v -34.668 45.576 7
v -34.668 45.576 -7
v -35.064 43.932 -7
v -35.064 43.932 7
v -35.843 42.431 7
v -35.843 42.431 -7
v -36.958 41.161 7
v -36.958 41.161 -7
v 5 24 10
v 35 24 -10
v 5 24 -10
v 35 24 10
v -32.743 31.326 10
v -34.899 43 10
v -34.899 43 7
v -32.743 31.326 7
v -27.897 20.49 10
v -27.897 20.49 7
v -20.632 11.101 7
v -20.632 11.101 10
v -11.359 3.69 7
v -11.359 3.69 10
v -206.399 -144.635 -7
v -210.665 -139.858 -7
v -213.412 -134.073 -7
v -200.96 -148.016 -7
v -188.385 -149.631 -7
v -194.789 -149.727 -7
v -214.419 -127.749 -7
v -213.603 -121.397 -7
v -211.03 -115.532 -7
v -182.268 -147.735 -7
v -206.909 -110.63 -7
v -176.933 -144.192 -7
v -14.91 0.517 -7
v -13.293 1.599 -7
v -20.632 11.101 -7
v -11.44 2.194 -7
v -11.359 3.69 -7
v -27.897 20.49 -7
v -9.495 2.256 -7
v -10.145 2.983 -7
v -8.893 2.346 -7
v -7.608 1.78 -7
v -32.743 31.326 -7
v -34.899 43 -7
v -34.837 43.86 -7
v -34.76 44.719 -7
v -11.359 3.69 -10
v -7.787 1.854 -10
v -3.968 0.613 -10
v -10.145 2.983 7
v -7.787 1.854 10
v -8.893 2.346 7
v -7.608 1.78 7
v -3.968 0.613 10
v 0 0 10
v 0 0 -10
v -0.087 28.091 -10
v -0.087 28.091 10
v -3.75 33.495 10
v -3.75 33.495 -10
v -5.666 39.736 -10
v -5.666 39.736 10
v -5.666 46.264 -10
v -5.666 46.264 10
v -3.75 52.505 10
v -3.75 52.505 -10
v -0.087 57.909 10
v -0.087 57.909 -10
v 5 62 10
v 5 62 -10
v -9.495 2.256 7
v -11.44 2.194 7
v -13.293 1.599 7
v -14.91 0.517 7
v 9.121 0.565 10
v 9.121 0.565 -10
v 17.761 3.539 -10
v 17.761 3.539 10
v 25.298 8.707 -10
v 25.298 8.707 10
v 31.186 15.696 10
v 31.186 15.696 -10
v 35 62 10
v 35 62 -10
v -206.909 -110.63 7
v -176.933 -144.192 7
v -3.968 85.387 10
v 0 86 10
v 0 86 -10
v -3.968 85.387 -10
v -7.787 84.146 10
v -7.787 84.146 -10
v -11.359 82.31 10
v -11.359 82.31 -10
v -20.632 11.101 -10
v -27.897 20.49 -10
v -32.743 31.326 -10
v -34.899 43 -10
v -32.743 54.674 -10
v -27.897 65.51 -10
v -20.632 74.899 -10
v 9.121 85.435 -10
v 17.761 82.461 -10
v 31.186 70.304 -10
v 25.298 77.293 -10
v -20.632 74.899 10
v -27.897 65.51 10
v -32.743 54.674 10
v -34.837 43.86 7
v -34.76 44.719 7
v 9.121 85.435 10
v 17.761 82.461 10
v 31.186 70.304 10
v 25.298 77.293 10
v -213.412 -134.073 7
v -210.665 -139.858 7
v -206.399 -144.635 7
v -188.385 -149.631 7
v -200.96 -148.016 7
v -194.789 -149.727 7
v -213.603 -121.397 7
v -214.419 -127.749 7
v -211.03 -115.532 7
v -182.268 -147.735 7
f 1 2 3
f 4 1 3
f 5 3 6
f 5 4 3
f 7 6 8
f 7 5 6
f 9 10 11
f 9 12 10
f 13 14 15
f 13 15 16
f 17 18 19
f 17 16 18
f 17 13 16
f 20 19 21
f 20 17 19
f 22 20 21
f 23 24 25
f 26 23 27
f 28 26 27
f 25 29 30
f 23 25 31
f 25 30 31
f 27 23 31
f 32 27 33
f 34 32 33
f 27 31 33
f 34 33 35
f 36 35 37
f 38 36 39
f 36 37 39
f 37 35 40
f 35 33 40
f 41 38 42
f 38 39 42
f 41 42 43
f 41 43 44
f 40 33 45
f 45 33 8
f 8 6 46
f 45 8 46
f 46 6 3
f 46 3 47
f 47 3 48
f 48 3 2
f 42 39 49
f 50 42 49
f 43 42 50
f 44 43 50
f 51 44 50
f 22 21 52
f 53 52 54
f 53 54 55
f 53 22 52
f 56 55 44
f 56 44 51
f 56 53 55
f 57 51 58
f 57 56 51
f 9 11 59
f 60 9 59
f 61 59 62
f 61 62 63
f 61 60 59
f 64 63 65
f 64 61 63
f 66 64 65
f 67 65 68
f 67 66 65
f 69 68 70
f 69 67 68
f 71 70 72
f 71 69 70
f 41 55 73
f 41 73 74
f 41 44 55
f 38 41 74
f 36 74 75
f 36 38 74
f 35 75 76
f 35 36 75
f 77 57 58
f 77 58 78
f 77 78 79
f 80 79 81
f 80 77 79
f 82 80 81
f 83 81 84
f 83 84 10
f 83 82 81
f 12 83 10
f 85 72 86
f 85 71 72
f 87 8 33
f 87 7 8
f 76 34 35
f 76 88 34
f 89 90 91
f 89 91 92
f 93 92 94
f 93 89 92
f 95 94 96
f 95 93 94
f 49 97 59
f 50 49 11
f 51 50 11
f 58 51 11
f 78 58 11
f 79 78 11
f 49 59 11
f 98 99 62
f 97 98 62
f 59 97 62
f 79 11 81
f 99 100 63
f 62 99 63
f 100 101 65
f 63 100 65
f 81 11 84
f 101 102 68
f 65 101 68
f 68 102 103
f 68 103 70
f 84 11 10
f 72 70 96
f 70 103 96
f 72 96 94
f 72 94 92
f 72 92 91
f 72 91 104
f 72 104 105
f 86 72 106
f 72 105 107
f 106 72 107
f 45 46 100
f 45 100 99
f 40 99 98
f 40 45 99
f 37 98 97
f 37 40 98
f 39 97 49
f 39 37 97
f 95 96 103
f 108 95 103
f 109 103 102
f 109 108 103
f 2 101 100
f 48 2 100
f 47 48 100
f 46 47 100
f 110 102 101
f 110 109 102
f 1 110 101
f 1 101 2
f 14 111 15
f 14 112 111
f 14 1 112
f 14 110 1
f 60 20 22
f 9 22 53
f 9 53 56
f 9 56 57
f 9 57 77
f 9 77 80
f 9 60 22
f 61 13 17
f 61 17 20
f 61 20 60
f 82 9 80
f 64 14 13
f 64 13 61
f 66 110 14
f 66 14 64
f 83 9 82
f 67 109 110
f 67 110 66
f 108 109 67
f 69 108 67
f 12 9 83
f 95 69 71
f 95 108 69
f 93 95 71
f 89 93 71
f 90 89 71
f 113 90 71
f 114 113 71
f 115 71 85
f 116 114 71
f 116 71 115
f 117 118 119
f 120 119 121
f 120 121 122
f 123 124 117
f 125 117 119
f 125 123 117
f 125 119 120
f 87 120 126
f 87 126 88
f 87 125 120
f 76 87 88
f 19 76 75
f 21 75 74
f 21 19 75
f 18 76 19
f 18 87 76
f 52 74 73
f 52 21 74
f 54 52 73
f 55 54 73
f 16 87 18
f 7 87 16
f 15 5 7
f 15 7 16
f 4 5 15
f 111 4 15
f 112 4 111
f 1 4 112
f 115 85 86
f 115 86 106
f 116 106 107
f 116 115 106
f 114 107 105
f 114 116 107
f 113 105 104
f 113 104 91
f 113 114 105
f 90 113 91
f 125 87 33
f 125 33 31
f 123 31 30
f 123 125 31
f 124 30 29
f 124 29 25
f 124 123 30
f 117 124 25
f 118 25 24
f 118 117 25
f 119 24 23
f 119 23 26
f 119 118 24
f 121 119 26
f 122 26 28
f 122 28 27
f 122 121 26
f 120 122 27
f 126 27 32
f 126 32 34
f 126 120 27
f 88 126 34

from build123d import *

# Parameters (mm, degrees)
F1_DEPTH = 7
F2_DEPTH = 10
F3_R     = 7


with BuildPart() as f1:
    # F0 (on Top) → F1 (new body, symmetric)
    with BuildSketch(Plane.XY):
        with BuildLine():
            ThreePointArc((-11.358531, 3.689624), (-27.896694, 20.489591), (-34.898927, 43))
            Line((-34.898927, 43), (-206.909318, -110.62962))
            ThreePointArc((-206.909318, -110.62962), (-208.702535, -142.398857), (-176.933299, -144.192073))
            Line((-176.933299, -144.192073), (-11.358531, 3.689624))
        make_face()
    extrude(amount=F1_DEPTH, both=True)

    # F0 (on Top) → F2 (join, symmetric)
    with BuildSketch(Plane.XY):
        with BuildLine():
            Line((5, 62), (35, 62))
            ThreePointArc((35, 62), (21.704163, 80.131071), (0, 86))
            ThreePointArc((0, 86), (-5.902823, 84.843409), (-11.358531, 82.310376))
            ThreePointArc((-11.358531, 82.310376), (-27.896694, 65.510409), (-34.898927, 43))
            ThreePointArc((-34.898927, 43), (-27.896694, 20.489591), (-11.358531, 3.689624))
            ThreePointArc((-11.358531, 3.689624), (-5.902823, 1.156591), (0, 0))
            ThreePointArc((0, 0), (21.704163, 5.868929), (35, 24))
            Line((35, 24), (5, 24))
            ThreePointArc((5, 24), (-5.909463, 43), (5, 62))
        make_face()
    extrude(amount=F2_DEPTH, both=True)

    # F3
    f3_edges = [f1.edges().sort_by_distance(p)[0] for p in [
        (-34.898927, 43, 0),
        (-11.358531, 3.689624, 0),
    ]]
    fillet(f3_edges, radius=F3_R)


solid = f1.part
